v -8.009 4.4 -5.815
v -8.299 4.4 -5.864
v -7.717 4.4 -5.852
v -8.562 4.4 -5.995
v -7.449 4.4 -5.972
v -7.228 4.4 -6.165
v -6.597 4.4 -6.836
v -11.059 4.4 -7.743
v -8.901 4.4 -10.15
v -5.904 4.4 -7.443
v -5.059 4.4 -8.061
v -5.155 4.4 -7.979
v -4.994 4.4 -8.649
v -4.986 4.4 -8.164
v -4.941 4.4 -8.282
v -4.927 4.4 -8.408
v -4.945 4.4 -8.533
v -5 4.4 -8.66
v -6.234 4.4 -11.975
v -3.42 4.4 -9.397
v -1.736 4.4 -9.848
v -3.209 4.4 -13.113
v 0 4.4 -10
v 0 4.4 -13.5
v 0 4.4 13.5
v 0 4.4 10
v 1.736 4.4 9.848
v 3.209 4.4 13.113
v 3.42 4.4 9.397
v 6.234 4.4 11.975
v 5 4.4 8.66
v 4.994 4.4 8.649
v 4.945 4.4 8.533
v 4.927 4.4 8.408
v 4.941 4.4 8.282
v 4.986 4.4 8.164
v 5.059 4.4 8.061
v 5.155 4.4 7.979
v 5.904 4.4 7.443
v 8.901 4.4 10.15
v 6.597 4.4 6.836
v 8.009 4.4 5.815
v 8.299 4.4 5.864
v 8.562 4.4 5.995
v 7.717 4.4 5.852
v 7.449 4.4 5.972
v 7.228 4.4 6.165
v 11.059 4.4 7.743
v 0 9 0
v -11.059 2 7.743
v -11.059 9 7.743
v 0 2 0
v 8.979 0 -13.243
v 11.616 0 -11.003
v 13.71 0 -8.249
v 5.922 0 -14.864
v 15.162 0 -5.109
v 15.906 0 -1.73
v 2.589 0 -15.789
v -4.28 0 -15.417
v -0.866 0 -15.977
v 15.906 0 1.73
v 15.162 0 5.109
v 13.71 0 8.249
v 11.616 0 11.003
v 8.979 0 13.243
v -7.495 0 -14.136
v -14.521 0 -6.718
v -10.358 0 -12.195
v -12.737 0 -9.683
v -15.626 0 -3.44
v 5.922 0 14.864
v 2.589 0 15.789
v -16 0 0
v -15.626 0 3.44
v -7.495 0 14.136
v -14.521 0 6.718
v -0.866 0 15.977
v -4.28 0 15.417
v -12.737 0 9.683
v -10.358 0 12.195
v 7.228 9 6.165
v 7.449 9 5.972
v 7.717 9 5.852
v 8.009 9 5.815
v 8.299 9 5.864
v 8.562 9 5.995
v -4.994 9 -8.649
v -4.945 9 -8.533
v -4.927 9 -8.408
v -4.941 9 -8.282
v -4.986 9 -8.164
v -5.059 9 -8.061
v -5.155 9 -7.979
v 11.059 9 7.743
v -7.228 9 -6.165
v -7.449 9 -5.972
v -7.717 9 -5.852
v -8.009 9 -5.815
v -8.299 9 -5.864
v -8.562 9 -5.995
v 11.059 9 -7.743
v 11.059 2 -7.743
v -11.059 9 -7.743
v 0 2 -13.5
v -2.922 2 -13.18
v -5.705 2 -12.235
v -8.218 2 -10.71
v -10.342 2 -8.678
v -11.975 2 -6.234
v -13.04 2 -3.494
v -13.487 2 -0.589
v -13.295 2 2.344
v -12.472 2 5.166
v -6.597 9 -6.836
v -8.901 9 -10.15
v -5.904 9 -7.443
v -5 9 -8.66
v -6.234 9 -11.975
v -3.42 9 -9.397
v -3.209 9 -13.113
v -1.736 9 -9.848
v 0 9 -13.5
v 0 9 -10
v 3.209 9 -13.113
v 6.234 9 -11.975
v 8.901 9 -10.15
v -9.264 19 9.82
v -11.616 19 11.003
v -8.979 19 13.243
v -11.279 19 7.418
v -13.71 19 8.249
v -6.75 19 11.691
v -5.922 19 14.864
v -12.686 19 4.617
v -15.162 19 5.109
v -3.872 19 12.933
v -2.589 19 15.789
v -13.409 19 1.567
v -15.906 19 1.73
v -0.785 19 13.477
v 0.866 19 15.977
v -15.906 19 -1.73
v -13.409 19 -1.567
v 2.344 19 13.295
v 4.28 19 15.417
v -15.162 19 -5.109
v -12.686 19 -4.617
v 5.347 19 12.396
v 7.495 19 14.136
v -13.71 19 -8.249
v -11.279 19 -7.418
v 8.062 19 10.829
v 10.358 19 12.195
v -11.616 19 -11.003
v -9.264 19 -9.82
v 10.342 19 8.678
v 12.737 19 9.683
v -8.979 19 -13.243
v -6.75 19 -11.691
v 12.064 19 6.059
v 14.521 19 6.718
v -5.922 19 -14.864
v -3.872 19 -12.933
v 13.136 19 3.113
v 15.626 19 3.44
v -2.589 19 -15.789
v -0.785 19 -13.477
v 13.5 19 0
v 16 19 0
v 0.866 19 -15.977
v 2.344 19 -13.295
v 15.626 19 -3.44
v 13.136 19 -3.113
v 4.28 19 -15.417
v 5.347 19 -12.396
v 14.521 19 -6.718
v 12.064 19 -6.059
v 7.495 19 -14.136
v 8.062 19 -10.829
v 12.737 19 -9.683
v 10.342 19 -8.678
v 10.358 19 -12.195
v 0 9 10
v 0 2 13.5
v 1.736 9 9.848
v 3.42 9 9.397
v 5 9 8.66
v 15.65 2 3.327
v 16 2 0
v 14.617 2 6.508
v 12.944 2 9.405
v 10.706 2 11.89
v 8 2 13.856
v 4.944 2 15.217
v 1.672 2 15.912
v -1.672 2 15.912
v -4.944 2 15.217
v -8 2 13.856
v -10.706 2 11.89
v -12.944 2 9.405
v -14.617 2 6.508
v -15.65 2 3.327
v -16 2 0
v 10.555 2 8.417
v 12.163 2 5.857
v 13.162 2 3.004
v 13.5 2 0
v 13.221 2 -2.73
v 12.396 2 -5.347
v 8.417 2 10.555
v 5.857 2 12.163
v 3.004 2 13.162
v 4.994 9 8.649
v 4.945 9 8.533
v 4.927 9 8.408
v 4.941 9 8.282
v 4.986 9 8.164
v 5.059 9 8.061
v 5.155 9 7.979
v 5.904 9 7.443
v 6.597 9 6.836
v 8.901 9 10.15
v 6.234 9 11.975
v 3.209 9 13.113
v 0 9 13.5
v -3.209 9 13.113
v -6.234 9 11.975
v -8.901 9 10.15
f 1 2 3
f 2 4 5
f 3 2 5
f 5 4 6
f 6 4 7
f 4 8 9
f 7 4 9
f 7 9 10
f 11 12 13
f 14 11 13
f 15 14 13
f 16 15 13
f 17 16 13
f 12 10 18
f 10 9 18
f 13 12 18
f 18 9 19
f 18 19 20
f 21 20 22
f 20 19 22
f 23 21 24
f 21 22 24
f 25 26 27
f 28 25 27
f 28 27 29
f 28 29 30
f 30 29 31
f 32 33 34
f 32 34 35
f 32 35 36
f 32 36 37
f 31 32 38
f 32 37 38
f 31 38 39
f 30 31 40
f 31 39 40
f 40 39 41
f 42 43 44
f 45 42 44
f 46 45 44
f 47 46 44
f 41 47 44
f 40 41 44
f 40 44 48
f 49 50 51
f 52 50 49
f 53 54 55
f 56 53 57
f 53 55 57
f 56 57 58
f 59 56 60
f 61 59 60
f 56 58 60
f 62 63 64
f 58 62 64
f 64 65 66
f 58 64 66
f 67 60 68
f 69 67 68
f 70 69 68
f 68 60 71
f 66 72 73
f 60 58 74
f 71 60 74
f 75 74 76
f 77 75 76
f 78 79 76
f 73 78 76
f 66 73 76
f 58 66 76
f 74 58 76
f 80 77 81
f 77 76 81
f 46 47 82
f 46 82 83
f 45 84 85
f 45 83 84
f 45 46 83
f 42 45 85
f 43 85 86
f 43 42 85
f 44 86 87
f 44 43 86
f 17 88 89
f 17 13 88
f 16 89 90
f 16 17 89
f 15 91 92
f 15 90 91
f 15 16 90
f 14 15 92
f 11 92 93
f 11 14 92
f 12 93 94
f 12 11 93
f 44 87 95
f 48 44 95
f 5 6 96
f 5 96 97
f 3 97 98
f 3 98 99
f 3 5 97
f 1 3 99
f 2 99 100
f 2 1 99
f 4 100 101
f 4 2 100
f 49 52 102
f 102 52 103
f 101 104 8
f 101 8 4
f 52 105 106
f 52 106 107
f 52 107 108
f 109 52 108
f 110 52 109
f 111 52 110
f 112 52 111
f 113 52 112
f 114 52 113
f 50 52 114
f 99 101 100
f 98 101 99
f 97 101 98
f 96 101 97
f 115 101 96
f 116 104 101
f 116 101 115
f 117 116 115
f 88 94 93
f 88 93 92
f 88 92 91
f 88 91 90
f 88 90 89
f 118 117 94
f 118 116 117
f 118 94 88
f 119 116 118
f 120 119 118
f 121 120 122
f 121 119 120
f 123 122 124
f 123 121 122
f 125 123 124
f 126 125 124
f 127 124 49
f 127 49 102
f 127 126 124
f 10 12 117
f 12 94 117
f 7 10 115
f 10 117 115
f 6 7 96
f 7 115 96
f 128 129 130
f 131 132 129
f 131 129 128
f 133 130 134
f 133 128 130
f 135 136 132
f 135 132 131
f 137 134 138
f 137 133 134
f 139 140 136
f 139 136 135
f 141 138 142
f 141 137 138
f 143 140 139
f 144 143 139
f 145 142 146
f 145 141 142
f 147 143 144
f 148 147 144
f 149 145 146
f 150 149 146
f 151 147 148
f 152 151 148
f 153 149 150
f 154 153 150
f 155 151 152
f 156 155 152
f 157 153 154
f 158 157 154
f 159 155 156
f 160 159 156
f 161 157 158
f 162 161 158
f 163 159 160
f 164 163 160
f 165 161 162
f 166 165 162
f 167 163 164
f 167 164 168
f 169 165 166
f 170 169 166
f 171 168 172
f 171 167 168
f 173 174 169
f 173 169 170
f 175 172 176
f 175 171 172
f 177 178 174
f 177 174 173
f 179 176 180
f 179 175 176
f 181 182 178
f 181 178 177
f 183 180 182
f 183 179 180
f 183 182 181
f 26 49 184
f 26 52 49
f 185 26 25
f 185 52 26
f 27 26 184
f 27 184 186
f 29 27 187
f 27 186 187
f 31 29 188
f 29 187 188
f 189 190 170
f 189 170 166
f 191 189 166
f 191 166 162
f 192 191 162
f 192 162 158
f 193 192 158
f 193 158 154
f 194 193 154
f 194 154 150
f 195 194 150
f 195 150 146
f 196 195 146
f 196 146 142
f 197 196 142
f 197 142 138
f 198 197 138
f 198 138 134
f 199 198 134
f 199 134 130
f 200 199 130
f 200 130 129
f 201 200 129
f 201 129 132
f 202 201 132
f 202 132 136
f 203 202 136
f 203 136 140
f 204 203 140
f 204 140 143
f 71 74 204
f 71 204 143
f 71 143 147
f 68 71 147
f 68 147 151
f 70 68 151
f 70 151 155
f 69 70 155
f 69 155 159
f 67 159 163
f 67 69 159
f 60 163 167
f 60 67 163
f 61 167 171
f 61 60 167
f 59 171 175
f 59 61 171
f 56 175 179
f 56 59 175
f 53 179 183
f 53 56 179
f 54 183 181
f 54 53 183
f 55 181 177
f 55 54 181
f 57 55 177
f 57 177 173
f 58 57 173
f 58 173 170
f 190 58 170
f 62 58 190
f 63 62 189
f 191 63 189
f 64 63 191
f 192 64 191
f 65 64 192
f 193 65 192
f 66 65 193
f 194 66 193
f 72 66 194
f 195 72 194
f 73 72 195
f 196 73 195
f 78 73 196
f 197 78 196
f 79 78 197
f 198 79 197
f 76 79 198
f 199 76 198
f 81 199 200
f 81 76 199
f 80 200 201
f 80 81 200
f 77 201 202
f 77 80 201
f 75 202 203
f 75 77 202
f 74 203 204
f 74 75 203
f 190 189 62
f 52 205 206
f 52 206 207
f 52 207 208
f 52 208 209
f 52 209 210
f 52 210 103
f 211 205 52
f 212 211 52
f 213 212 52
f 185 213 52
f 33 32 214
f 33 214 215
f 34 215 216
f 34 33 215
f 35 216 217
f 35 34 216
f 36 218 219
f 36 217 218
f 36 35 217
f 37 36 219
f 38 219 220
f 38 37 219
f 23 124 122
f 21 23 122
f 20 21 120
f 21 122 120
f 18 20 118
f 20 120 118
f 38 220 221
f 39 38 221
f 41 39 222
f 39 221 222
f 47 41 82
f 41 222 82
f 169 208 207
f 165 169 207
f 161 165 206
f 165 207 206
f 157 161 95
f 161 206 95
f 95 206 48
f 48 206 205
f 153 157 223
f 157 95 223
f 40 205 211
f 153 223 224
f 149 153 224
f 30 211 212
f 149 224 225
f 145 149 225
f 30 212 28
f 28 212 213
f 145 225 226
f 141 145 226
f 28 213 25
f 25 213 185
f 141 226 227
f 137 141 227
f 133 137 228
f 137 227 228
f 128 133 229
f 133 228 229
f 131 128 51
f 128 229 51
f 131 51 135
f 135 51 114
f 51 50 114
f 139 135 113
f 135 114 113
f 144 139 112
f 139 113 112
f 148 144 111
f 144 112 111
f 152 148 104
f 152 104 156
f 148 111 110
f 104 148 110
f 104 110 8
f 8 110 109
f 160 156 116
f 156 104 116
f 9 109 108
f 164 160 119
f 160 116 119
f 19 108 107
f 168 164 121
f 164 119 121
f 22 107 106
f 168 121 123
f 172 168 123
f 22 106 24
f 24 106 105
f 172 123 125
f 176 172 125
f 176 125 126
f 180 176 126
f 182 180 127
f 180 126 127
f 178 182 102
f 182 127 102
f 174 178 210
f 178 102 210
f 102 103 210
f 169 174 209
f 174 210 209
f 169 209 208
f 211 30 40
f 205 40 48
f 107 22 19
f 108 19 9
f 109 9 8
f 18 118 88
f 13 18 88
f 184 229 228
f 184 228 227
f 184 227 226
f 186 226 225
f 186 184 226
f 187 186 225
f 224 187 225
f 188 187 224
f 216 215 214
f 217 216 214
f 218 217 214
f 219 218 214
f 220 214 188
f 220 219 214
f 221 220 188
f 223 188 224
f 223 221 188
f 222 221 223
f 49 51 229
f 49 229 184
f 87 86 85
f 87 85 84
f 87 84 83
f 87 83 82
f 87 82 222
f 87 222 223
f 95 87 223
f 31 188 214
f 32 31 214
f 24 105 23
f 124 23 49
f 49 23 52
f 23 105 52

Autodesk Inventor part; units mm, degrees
ref_plane "YZ Plane" through (0, 0, 0) normal (1, 0, 0) x (0, 1, 0)
ref_plane "XZ Plane" through (0, 0, 0) normal (0, 1, 0) x (-1, 0, 0)
ref_plane "XY Plane" through (0, 0, 0) normal (0, 0, 1) x (1, 0, 0)
sketch "スケッチ1" plane through (0, 0, 0) normal (0, 1, 0) x (-1, 0, 0)
  circle A0 centre (0, 0) radius 16
  dimension "d0" = 32
extrude "押し出し1" add sketch "スケッチ1" along normal blind 2
sketch "スケッチ2" plane through (0, 2, 0) normal (0, 1, 0) x (1, 0, 0)
  circle A0 centre (0, 0) radius 16
  circle A1 centre (0, 0) radius 13.5
  dimension "d3" = 32
  dimension "d4" = 27
extrude "押し出し2" add sketch "スケッチ2" along normal blind 17
sketch "スケッチ3" plane through (0, 2, 0) normal (0, 1, 0) x (1, 0, 0)
  arc A0 (-11.0586, -7.7433) -> (0, -13.5) centre (0, 0) ccw
  line L0 (0, 0) -> (-11.0586, -7.7433) construction
  line L1 (0, 0) -> (0, -13.5) construction
  arc A1 (11.0586, 7.7433) -> (0, 13.5) centre (0, 0) ccw
  line L2 (0, 0) -> (11.0586, 7.7433) construction
  line L3 (0, 0) -> (0, 13.5) construction
  circle A2 centre (0, 0) radius 13.5 projected
  line L4 (-11.0586, -7.7433) -> (0, 0)
  line L5 (0, 0) -> (0, -13.5)
  line L6 (0, 13.5) -> (0, 0)
  line L7 (0, 0) -> (11.0586, 7.7433)
  dimension "d7" = 13.5
  dimension "d8" = 55
  dimension "d9" = 13.5
  dimension "d10" = 55
extrude "押し出し3" add sketch "スケッチ3" along normal blind 7 contours L4 L5 A0 | A1 L7 L6
sketch "スケッチ4" plane through (0, 9, 0) normal (0, 1, 0) x (1, 0, 0)
  line L0 (0, -13.5) -> (0, 0) projected
  arc A0 (0, -13.5) -> (11.0586, -7.7433) centre (0, 0) ccw
  line L1 (0, 0) -> (11.0586, -7.7433) construction
  line L2 (0, 0) -> (0, -13.5) construction
  line L3 (0, 0) -> (-11.0586, -7.7433) projected
  arc A1 (0, -10) -> (5, -8.6603) centre (0, 0) ccw
  line L4 (0, 0) -> (5, -8.6603) construction
  line L5 (0, 0) -> (0, -10) construction
  arc A2 (4.75, -8.2272) -> (7.7819, -5.449) centre (0, 0) ccw
  line L6 (0, 0) -> (7.7819, -5.449) construction
  line L7 (0, 0) -> (4.75, -8.2272) construction
  line L8 (0, -13.5) -> (0, -10)
  line L9 (5, -8.6603) -> (4.75, -8.2272)
  line L10 (7.7819, -5.449) -> (11.0586, -7.7433)
  dimension "d13" = 13.5
  dimension "d14" = 55
  dimension "d15" = 10
  dimension "d16" = 30
  dimension "d17" = 9.5
  dimension "d18" = 25
sketch "スケッチ5" plane through (0, 9, 0) normal (0, 1, 0) x (1, 0, 0)
  line L0 (0, -13.5) -> (0, 0) projected
  line L1 (0, 13.5) -> (0, 0) projected
  arc A0 (0, 13.5) -> (-11.0586, 7.7433) centre (0, 0) ccw
  line L2 (0, 0) -> (-11.0586, 7.7433) construction
  line L3 (0, 0) -> (0, 13.5) construction
  line L4 (0, 0) -> (-11.0586, -7.7433) projected
  arc A1 (0, 10) -> (-5, 8.6603) centre (0, 0) ccw
  line L5 (0, 0) -> (-5, 8.6603) construction
  line L6 (0, 0) -> (0, 10) construction
  arc A2 (-4.75, 8.2272) -> (-7.7819, 5.449) centre (0, 0) ccw
  line L7 (0, 0) -> (-7.7819, 5.449) construction
  line L8 (0, 0) -> (-4.75, 8.2272) construction
  line L9 (0, 13.5) -> (0, 10)
  line L10 (-5, 8.6603) -> (-4.75, 8.2272)
  line L11 (-11.0586, 7.7433) -> (-7.7819, 5.449)
  dimension "d21" = 13.5
  dimension "d22" = 55
  dimension "d23" = 10
  dimension "d24" = 30
  dimension "d25" = 9.5
  dimension "d26" = 25
extrude "押し出し4" add sketch "スケッチ4" against normal blind 4.6
extrude "押し出し5" add sketch "スケッチ5" against normal blind 4.6
fillet "フィレット1" radius 1 2 edges at (-7.7819, 6.7, -5.449) (7.7819, 6.7, 5.449)
fillet "フィレット2" radius 0.5 1 edges at (-4.75, 6.7, -8.2272)
fillet "フィレット3" radius 0.5 1 edges at (4.75, 6.7, 8.2272)
properties part number "kumi4-2"
